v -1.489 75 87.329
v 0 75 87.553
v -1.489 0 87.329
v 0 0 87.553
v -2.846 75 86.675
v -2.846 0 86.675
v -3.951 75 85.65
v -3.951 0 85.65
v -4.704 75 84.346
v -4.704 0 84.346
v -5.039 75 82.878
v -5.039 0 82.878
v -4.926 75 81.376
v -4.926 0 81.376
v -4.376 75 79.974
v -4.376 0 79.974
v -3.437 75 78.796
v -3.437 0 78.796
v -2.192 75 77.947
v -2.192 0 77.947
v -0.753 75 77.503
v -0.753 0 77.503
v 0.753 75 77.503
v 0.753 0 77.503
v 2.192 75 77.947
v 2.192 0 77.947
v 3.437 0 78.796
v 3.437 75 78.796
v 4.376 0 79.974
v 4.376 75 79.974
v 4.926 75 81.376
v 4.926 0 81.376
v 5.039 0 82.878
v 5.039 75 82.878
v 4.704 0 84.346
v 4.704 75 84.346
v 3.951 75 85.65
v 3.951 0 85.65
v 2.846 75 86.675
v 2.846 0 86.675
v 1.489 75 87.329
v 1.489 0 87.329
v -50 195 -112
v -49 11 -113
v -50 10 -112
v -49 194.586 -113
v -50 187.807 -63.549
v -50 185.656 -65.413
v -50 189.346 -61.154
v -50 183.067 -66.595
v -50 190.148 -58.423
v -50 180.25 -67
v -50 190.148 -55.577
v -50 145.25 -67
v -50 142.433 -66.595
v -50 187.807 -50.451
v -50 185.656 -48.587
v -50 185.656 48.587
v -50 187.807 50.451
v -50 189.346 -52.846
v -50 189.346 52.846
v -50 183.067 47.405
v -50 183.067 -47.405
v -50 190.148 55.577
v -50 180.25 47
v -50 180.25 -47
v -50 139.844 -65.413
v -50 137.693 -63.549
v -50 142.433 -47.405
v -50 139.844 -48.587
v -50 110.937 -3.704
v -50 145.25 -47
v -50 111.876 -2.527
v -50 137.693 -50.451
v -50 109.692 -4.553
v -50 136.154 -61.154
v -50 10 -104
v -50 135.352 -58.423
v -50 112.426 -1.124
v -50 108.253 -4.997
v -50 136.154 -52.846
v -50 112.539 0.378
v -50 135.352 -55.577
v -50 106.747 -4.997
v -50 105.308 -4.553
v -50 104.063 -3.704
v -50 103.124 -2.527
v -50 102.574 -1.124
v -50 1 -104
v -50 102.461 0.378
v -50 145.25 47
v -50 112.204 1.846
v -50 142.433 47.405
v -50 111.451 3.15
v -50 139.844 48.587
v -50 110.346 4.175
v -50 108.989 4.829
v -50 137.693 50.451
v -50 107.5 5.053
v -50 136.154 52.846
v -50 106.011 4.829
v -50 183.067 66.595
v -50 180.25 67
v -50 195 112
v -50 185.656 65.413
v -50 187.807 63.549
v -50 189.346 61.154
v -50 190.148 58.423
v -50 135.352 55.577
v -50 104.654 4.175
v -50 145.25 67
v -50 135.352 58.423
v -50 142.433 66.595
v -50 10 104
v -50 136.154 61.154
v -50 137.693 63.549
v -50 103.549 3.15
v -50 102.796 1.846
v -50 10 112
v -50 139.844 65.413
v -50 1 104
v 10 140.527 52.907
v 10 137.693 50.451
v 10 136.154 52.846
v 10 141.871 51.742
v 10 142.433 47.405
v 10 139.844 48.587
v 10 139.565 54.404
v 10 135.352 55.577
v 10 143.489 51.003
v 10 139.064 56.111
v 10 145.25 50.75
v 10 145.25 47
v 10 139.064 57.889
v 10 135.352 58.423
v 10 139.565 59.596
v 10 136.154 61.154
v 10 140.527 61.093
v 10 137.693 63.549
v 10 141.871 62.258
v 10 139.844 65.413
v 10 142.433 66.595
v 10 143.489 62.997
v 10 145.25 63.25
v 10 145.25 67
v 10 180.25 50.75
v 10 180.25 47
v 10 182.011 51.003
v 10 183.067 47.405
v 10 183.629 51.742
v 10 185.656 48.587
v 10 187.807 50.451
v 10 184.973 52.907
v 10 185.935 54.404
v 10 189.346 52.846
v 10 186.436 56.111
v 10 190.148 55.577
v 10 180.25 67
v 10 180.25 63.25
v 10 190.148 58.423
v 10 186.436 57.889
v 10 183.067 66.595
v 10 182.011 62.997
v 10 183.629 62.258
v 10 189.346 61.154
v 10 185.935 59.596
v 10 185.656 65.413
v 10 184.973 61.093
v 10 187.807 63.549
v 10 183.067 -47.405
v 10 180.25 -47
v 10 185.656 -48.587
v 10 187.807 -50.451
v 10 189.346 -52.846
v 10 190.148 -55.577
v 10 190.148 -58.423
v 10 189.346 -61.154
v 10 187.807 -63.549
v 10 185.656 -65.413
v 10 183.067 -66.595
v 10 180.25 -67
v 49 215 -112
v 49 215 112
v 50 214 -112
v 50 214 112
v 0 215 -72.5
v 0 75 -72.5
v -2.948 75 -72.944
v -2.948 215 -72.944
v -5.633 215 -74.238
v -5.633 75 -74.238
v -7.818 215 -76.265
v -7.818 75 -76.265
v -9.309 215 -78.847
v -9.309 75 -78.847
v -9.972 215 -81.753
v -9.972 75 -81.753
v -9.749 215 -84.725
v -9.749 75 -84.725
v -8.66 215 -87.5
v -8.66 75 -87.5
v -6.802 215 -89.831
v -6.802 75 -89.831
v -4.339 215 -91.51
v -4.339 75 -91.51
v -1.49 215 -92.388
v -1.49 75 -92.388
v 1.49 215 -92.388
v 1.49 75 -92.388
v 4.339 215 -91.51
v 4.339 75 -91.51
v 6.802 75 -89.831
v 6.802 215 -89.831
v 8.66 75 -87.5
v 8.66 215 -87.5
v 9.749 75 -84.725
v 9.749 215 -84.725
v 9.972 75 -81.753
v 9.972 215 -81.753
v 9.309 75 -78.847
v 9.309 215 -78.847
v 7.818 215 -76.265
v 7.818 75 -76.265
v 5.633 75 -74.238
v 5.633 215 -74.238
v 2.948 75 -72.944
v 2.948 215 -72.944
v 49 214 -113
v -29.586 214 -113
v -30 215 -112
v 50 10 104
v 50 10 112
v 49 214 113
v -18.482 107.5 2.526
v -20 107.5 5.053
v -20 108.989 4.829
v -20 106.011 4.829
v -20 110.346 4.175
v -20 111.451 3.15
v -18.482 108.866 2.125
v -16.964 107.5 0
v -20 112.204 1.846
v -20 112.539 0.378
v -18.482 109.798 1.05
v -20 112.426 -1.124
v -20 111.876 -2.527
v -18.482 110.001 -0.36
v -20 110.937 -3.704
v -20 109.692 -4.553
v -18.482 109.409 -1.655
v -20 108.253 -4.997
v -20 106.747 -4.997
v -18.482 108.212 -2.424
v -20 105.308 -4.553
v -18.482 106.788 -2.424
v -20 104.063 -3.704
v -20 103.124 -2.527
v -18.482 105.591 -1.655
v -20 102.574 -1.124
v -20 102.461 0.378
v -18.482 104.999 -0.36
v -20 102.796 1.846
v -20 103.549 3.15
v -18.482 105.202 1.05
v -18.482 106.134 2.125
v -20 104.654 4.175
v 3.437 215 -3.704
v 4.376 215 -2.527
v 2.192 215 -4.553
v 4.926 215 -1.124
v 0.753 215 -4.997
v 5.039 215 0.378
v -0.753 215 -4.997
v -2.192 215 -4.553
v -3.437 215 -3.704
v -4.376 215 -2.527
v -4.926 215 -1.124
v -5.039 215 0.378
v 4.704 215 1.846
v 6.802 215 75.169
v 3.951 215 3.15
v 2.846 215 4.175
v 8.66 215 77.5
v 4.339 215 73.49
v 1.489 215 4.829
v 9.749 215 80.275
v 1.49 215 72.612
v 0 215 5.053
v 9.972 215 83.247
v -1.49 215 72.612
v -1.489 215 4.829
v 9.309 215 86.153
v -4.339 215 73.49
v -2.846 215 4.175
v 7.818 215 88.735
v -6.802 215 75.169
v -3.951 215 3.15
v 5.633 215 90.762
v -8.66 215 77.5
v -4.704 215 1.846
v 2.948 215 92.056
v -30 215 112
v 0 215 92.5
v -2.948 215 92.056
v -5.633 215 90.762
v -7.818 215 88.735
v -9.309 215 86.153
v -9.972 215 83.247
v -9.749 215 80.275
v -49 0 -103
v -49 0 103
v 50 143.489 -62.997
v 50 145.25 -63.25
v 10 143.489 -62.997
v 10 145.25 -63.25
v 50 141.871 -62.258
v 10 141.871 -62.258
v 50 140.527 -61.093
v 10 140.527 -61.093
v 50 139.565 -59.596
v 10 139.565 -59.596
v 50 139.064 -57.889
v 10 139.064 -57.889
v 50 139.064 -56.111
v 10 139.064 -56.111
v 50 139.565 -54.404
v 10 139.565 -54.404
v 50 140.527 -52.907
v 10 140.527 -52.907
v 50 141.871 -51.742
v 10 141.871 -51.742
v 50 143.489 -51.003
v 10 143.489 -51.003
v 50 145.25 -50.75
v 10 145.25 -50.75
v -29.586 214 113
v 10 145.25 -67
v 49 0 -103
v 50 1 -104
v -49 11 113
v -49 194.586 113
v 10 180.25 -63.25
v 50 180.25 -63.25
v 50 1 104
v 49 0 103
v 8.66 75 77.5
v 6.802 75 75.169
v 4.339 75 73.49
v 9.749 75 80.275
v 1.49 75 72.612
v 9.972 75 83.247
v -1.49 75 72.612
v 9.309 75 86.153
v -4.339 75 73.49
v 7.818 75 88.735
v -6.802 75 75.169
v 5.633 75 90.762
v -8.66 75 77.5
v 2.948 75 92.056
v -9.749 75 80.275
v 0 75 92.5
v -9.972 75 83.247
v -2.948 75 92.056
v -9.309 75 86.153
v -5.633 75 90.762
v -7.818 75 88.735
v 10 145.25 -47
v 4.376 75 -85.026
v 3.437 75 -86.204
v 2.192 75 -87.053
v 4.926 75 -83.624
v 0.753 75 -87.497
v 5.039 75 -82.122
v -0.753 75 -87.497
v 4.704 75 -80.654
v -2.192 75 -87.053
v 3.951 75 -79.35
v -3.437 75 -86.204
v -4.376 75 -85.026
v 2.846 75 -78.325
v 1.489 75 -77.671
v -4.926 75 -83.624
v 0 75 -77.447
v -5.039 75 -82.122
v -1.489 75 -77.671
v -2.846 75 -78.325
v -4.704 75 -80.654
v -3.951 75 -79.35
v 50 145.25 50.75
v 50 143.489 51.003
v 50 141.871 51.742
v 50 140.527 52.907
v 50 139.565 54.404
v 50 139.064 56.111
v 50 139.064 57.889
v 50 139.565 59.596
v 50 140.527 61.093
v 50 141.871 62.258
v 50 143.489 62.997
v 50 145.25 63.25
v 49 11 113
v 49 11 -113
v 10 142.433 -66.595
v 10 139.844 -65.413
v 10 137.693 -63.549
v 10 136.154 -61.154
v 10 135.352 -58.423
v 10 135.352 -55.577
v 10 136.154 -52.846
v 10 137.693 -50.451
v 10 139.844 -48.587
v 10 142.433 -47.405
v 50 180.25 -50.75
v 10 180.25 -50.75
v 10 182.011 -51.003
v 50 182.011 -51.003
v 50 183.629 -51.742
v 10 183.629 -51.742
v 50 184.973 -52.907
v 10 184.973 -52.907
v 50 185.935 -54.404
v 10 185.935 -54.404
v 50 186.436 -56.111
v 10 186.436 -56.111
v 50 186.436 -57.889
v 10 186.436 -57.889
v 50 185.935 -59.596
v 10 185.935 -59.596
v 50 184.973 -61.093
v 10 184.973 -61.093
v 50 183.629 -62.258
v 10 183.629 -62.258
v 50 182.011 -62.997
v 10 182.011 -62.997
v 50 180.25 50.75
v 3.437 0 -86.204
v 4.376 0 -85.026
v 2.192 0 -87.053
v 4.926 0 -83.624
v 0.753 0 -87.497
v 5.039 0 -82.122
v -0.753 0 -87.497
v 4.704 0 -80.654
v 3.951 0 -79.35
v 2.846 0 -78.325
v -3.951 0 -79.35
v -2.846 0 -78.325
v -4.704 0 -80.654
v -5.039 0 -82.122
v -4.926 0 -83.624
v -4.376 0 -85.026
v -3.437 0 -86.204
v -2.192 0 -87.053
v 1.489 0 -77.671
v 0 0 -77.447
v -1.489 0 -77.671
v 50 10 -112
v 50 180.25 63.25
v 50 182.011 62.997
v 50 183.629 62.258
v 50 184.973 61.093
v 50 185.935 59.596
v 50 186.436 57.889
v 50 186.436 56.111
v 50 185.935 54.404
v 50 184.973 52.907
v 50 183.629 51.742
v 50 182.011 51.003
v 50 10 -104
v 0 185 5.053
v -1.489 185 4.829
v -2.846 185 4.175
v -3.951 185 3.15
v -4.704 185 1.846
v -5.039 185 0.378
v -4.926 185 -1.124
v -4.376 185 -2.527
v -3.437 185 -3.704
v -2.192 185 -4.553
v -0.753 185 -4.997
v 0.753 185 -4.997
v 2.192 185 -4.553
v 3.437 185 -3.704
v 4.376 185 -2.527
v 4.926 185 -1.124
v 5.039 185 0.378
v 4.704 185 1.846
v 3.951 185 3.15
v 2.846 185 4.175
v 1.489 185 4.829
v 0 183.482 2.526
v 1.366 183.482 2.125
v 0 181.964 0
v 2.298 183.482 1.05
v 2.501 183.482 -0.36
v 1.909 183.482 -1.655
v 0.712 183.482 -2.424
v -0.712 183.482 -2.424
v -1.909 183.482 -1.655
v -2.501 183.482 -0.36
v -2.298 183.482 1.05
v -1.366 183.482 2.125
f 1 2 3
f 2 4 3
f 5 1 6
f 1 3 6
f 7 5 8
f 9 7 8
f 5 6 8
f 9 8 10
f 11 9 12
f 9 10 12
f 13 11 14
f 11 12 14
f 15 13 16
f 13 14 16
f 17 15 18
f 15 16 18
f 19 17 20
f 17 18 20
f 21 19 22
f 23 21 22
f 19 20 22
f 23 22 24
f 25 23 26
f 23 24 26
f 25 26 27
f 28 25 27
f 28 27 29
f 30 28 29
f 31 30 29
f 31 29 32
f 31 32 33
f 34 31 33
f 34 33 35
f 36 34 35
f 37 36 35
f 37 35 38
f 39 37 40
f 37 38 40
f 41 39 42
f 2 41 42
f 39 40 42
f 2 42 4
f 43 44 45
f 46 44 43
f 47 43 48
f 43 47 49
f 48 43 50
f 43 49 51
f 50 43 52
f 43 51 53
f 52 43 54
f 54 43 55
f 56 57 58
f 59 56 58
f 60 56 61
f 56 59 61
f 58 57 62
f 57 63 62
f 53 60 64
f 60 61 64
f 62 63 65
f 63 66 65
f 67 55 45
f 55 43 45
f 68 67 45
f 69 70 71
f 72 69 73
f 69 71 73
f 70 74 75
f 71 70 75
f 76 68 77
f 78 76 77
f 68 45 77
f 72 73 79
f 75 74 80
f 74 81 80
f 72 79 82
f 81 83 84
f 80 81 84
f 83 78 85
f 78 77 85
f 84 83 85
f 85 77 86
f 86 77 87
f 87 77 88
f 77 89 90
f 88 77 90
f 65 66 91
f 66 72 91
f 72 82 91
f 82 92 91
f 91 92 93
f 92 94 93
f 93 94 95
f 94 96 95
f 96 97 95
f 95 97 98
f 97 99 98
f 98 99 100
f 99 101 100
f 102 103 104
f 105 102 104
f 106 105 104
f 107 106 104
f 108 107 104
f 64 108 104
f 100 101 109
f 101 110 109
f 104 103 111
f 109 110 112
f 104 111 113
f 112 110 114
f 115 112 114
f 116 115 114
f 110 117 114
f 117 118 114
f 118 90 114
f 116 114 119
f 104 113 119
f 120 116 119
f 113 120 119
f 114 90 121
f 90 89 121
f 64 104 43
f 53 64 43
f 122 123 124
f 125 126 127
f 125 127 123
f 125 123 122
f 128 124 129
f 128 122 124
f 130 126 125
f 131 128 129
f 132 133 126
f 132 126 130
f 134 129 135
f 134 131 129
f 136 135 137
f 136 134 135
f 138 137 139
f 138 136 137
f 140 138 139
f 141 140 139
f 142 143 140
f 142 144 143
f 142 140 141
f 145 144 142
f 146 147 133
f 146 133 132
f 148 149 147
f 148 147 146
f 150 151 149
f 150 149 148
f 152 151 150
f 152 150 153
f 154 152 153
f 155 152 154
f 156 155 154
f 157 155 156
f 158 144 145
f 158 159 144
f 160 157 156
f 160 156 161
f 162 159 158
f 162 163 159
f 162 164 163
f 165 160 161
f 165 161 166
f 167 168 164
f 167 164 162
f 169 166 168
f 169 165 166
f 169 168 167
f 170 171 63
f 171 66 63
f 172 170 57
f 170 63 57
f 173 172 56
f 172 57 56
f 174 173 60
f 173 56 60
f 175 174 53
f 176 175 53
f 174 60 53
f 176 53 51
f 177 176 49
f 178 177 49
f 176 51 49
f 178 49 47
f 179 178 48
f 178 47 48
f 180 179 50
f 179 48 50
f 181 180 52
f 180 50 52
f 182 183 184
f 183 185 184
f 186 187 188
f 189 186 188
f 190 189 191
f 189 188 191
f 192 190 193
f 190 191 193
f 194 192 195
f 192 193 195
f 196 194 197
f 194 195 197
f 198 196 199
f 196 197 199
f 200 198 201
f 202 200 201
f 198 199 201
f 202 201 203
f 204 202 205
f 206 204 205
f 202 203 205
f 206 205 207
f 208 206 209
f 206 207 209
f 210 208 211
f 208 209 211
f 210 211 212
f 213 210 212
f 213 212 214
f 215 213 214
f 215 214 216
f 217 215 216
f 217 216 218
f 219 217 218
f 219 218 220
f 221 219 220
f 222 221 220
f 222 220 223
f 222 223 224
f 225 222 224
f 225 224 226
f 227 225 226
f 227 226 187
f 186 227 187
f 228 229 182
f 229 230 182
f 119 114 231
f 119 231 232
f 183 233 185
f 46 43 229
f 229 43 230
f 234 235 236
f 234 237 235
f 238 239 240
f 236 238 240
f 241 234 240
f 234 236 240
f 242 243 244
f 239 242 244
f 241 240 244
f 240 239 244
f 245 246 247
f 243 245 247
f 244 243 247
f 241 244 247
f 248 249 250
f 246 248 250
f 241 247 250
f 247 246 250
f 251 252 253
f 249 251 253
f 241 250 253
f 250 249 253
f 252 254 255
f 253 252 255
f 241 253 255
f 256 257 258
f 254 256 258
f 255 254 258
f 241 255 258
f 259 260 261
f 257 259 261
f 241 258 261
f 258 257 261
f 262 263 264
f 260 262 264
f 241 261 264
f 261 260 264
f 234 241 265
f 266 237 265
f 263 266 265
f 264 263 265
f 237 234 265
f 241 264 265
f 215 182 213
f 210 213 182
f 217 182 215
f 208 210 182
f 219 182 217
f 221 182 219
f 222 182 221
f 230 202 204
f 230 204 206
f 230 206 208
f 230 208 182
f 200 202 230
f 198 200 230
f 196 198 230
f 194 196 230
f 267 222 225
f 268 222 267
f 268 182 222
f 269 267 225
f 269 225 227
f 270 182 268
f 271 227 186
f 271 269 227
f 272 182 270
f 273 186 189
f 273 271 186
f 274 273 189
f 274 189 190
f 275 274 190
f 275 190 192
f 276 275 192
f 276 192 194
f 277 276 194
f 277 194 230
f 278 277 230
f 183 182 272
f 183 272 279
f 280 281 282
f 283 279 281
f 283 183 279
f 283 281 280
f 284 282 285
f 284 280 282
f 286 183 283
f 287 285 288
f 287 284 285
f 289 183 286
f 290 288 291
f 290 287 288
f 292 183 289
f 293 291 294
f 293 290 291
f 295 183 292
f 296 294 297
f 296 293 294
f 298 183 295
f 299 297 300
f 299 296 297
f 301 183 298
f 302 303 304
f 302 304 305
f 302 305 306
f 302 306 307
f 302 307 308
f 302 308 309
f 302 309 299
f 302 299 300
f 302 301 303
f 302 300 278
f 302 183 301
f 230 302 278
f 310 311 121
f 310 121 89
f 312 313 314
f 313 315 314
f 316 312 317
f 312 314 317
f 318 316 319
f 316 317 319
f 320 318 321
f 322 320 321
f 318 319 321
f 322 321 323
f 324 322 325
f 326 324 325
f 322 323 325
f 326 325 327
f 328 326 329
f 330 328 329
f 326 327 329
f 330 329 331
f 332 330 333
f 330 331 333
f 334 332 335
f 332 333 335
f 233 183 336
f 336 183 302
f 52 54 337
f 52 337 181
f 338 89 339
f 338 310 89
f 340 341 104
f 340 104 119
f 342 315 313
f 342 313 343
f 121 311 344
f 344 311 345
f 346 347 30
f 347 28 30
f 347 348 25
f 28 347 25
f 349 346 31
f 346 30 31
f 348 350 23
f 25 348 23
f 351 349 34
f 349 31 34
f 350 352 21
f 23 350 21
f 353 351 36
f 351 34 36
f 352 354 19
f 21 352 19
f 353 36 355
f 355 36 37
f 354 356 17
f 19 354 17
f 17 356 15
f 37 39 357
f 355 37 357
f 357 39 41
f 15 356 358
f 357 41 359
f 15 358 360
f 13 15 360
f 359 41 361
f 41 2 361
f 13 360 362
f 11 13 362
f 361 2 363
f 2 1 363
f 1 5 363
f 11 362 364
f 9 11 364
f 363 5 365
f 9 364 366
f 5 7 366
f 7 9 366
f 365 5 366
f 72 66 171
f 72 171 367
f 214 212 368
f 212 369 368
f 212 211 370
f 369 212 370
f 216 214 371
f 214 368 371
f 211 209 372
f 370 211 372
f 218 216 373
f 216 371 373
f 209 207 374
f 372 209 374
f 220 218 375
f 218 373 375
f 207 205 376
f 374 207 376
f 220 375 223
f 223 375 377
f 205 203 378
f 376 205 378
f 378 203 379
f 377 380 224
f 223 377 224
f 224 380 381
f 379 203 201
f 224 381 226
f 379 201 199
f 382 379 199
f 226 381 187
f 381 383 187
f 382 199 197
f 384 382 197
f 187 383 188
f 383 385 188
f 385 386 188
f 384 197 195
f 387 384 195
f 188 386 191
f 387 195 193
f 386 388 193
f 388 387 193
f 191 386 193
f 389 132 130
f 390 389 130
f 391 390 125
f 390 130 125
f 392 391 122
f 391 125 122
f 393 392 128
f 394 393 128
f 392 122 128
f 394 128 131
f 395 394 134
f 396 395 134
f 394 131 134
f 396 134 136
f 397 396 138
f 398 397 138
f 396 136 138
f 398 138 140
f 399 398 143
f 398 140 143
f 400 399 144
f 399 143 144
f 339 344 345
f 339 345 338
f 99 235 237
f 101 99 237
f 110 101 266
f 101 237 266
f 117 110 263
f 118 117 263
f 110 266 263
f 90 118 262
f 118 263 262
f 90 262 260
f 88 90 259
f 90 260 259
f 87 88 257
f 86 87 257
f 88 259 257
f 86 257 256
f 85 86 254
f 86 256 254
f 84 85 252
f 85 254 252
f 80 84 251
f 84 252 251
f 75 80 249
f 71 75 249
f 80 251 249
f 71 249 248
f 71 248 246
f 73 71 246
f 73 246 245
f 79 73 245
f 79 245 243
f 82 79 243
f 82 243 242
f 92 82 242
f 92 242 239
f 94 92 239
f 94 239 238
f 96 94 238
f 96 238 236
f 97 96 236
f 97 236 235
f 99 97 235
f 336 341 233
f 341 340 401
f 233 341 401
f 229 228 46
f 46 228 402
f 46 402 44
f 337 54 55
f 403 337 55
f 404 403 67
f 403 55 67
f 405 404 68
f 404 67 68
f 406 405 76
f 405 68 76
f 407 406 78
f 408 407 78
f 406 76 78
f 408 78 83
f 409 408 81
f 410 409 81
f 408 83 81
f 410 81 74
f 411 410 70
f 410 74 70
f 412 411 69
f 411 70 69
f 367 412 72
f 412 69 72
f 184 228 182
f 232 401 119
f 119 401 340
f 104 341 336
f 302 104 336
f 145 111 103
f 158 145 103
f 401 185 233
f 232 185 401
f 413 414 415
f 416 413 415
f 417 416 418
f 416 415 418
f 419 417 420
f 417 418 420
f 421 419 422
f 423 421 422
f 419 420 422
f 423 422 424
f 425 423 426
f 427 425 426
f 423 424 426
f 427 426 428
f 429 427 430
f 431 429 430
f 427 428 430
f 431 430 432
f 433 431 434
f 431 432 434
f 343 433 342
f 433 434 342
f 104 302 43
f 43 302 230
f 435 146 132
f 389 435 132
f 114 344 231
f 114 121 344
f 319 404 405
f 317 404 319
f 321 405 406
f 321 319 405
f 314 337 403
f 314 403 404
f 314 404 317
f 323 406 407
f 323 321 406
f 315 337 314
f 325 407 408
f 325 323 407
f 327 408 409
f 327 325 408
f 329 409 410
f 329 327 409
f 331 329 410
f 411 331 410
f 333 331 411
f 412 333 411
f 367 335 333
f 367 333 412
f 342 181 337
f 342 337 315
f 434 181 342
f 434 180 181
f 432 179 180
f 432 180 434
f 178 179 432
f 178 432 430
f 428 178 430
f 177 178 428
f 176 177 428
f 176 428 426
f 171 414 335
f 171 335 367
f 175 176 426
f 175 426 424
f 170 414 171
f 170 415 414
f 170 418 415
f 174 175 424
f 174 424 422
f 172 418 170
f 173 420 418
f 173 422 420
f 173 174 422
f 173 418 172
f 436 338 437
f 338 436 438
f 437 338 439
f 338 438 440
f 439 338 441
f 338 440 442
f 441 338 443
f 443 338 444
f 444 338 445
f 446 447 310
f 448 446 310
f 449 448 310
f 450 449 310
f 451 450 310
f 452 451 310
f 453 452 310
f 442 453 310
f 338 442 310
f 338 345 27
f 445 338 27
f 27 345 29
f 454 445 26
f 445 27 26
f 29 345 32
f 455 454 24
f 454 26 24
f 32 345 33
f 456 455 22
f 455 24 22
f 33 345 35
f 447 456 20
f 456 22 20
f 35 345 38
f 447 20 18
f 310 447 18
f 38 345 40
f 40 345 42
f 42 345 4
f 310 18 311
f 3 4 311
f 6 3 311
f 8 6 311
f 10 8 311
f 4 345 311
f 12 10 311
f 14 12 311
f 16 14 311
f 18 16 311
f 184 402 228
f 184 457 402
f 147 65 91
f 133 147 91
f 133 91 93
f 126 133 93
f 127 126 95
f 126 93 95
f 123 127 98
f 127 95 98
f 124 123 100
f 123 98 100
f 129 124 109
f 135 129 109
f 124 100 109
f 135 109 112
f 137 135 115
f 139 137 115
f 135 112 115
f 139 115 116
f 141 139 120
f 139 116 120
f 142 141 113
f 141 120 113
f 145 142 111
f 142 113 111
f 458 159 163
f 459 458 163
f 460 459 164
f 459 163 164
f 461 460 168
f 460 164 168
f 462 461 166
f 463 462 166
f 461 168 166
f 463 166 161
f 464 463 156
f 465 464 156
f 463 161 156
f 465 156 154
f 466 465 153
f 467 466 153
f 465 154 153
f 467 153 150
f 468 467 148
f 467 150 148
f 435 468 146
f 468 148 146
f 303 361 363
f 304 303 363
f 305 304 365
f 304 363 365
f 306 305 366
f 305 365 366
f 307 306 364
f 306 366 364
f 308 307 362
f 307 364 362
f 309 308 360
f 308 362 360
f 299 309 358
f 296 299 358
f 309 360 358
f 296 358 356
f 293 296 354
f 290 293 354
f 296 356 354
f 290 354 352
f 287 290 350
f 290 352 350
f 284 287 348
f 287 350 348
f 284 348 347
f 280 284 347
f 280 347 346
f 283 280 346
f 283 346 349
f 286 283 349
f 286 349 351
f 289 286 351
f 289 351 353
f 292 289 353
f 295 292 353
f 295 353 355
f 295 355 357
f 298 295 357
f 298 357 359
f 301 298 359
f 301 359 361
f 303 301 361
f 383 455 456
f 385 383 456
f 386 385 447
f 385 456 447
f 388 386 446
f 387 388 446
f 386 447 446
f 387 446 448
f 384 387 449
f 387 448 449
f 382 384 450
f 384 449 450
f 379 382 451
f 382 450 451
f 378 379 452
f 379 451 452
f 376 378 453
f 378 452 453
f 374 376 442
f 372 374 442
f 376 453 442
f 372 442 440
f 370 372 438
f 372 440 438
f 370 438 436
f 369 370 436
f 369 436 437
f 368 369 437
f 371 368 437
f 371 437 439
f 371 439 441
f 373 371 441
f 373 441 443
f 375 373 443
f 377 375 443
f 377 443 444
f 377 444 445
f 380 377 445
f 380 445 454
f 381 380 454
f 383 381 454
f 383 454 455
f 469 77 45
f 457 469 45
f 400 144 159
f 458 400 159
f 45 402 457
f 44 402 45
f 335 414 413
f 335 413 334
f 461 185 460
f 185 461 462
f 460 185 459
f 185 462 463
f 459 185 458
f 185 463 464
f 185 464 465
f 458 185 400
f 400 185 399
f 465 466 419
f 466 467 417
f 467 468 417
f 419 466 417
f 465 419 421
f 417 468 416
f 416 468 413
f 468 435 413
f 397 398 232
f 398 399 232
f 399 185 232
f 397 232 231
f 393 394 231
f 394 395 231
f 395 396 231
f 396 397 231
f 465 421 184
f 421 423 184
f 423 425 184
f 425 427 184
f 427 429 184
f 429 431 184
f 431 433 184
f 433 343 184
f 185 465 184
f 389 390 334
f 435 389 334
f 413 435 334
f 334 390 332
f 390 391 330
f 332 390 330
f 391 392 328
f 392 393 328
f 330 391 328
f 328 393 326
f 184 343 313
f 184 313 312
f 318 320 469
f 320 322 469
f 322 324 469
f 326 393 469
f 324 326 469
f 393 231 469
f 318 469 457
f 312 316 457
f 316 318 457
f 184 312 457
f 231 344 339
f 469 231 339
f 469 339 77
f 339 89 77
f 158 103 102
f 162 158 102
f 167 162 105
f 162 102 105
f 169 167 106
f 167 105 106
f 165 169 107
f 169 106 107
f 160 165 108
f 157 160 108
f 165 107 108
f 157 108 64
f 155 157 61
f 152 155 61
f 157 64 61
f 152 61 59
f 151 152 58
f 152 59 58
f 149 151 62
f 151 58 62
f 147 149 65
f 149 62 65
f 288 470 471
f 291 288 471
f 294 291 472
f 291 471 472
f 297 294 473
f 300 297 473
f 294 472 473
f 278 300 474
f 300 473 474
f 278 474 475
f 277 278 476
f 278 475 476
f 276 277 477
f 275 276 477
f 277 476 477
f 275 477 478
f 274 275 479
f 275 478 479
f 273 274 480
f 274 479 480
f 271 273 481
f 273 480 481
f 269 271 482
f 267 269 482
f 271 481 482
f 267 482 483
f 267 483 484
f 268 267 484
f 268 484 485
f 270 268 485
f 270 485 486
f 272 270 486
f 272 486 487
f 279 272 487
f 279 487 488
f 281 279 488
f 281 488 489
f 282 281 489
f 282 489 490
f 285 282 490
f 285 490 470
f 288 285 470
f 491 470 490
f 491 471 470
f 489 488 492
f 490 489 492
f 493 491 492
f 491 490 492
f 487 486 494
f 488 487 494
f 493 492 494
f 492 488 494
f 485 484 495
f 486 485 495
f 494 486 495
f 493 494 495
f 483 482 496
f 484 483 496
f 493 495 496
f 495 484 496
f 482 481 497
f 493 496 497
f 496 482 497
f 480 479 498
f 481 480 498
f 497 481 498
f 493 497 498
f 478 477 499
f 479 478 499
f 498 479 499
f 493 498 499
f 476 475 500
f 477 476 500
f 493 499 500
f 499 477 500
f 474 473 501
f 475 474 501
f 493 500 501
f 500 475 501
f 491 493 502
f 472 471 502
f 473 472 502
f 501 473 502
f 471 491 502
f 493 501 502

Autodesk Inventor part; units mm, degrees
ref_plane "YZ Plane" through (0, 0, 0) normal (1, 0, 0) x (0, 1, 0)
ref_plane "XZ Plane" through (0, 0, 0) normal (0, 1, 0) x (-1, 0, 0)
ref_plane "XY Plane" through (0, 0, 0) normal (0, 0, 1) x (1, 0, 0)
sketch "Sketch5" plane through (0, 0, 0) normal (0, 1, 0) x (-1, 0, 0)
  line L0 (50, 113) -> (-50, 113)
  line L1 (-50, 113) -> (-50, -113)
  line L2 (-50, -113) -> (50, -113)
  line L3 (50, -113) -> (50, 113)
  point P0 (0, 0)
  point P1 (50, 0)
  point P2 (0, 113)
  dimension "d8" = 100
  dimension "d9" = 226
extrude "Extrusion5" add sketch "Sketch5" along normal blind 215
sketch "Sketch9" plane through (-50, 0, -113) normal (-1, 0, 0) x (0, 0, 1)
  line L0 (0, 215) -> (226, 215) projected
  line L1 (170, 180.25) -> (170, 145.25) construction
  line L2 (163.75, 180.25) -> (163.75, 145.25)
  line L3 (176.25, 145.25) -> (176.25, 180.25)
  arc A0 (176.25, 180.25) -> (163.75, 180.25) centre (170, 180.25) ccw
  arc A1 (163.75, 145.25) -> (176.25, 145.25) centre (170, 145.25) ccw
  line L4 (113, 215) -> (113, 186.8149) construction
  line L5 (56, 180.25) -> (56, 145.25) construction
  line L6 (62.25, 180.25) -> (62.25, 145.25)
  line L7 (49.75, 145.25) -> (49.75, 180.25)
  arc A2 (62.25, 180.25) -> (49.75, 180.25) centre (56, 180.25) ccw
  arc A3 (49.75, 145.25) -> (62.25, 145.25) centre (56, 145.25) ccw
  line L8 (180, 145.25) -> (180, 180.25)
  arc A4 (180, 180.25) -> (160, 180.25) centre (170, 180.25) ccw
  line L9 (160, 180.25) -> (160, 145.25)
  arc A5 (160, 145.25) -> (180, 145.25) centre (170, 145.25) ccw
  line L10 (46, 145.25) -> (46, 180.25)
  arc A6 (66, 180.25) -> (46, 180.25) centre (56, 180.25) ccw
  line L11 (66, 180.25) -> (66, 145.25)
  arc A7 (46, 145.25) -> (66, 145.25) centre (56, 145.25) ccw
  circle A8 centre (170, 145.25) radius 9
  point P0 (113, 0)
  point P1 (170, 162.75)
  point P2 (56, 162.75)
  dimension "d41" = 34.75
  dimension "d42" = 35
  dimension "d44" = 114
  dimension "d45" = 57
  dimension "d46" = 12.5
  dimension "d47" = 20
  dimension "d93" = 18
extrude "Extrusion7" cut sketch "Sketch9" against normal through all contours A0 L3 A8 L2 | A8 L3 A1 L2 | L6 A3 L7 A2 picked at (169.6717, 148.232)
extrude "Extrusion8" cut sketch "Sketch9" against normal blind 60 contours L2 A1 L3 A8 | A5 L9 A4 L8 | L10 A6 L11 A7 picked at (163.2862, 148.9936)
chamfer "Chamfer4" distance 20 angle 45 1 edges at (-50, 215, 0)
sketch "Sketch10" plane through (0, 215, 0) normal (0, 1, 0) x (1, 0, 0)
  circle A0 centre (0, -82.5) radius 6
  circle A1 centre (0, 82.5) radius 6
  circle A2 centre (0, -82.5) radius 10
  circle A3 centre (0, 82.5) radius 10
  line L0 (50, -113) -> (50, 113) projected
  line L1 (-50, -113) -> (50, -113) projected
  point P0 (0, 0)
  point P1 (0, -113)
  dimension "d55" = 165
  dimension "d56" = 82.5
  dimension "d57" = 12
  dimension "d58" = 20
  dimension "d92" = 50
hole "Hole2" at (0, 215, 82.5) at (0, 215, -82.5) direction (0, -1, 0) diameter 20 depth 140
sketch "Sketch11" plane through (0, 75, -82.5) normal (0, 1, 0) x (1, 0, 0)
  circle A0 centre (0, 0) radius 10 projected
  circle A1 centre (0, 0) radius 6
  circle A2 centre (0, -165) radius 6
  circle A3 centre (0, -165) radius 10 projected
  circle A4 centre (0, 0) radius 10 projected
  point P0 (0, -82.5)
  dimension "d66" = 12
hole "Hole3" at (0, 75, -82.5) at (0, 75, 82.5) direction (0, -1, 0) diameter 10.106 end through all thread size "M12x1.75" class "6H" standard "ISO Metric profile"
sketch "Sketch12" plane through (0, 215, 0) normal (0, 1, 0) x (1, 0, 0)
  circle A0 centre (0, -82.5) radius 10 projected
  line L0 (50, -113) -> (50, 113) projected
  circle A1 centre (0, 0) radius 6
  point P0 (50, 0)
  dimension "d74" = 12
hole "Hole4" at (0, 215, 0) direction (0, -1, 0) diameter 10.106 depth 30 tip angle 118 thread size "M12x1.75" class "6H" standard "ANSI Metric M Profile"
sketch "Sketch13" plane through (-50, 0, -113) normal (-1, 0, 0) x (0, 0, 1)
  line L0 (0, 0) -> (226, 0) projected
  circle A0 centre (113, 107.5) radius 6
  line L1 (0, 0) -> (0, 215) projected
  line L2 (226, 215) -> (0, 215) projected
  point P0 (113, 0)
  point P1 (0, 107.5)
  point P2 (113, 0)
  dimension "d82" = 12
  dimension "d83" = 107.5
hole "Hole5" at (-50, 107.5, 0) direction (1, 0, 0) diameter 10.106 depth 30 tip angle 118 thread size "M12x1.75" class "6H" standard "ANSI Metric M Profile"
chamfer "Chamfer5" distance 1 angle 45 13 edges at (-50, 97.5, 113) (-40, 205, 113) (10, 215, 113) (10, 215, -113) (-40, 205, -113) (-50, 97.5, -113) (0, 0, -113) (0, 0, 113) (50, 107.5, 113) (50, 107.5, -113) (50, 215, 0) (50, 0, 0) (-50, 0, 0)
sketch "Sketch14" plane through (-50, 1, -112) normal (-1, 0, 0) x (0, 0, 1)
  line L0 (225, -1) -> (216, -1)
  line L1 (216, -1) -> (216, 9)
  line L2 (216, 9) -> (225, 9)
  line L3 (225, 9) -> (225, -1)
  line L4 (225, 0) -> (225, 193.5858) projected
  line L5 (0, -1) -> (224, -1) projected
  line L6 (112, -1) -> (112, -17.0176) construction
  line L7 (-1, -1) -> (8, -1)
  line L8 (8, -1) -> (8, 9)
  line L9 (8, 9) -> (-1, 9)
  line L10 (-1, 9) -> (-1, -1)
  point P0 (-1, 0)
  dimension "d97" = 10
  dimension "d98" = 9
extrude "Extrusion9" cut sketch "Sketch14" against normal through all
chamfer "Chamfer6" distance 1 angle 45 4 edges at (0, 10, 113) (0, 0, 104) (0, 0, -104) (0, 10, -113)
equation "\"d56\" = 0.5 * d55"
properties part number "BC-10009" material "Aço Carbono AISI 1006"
